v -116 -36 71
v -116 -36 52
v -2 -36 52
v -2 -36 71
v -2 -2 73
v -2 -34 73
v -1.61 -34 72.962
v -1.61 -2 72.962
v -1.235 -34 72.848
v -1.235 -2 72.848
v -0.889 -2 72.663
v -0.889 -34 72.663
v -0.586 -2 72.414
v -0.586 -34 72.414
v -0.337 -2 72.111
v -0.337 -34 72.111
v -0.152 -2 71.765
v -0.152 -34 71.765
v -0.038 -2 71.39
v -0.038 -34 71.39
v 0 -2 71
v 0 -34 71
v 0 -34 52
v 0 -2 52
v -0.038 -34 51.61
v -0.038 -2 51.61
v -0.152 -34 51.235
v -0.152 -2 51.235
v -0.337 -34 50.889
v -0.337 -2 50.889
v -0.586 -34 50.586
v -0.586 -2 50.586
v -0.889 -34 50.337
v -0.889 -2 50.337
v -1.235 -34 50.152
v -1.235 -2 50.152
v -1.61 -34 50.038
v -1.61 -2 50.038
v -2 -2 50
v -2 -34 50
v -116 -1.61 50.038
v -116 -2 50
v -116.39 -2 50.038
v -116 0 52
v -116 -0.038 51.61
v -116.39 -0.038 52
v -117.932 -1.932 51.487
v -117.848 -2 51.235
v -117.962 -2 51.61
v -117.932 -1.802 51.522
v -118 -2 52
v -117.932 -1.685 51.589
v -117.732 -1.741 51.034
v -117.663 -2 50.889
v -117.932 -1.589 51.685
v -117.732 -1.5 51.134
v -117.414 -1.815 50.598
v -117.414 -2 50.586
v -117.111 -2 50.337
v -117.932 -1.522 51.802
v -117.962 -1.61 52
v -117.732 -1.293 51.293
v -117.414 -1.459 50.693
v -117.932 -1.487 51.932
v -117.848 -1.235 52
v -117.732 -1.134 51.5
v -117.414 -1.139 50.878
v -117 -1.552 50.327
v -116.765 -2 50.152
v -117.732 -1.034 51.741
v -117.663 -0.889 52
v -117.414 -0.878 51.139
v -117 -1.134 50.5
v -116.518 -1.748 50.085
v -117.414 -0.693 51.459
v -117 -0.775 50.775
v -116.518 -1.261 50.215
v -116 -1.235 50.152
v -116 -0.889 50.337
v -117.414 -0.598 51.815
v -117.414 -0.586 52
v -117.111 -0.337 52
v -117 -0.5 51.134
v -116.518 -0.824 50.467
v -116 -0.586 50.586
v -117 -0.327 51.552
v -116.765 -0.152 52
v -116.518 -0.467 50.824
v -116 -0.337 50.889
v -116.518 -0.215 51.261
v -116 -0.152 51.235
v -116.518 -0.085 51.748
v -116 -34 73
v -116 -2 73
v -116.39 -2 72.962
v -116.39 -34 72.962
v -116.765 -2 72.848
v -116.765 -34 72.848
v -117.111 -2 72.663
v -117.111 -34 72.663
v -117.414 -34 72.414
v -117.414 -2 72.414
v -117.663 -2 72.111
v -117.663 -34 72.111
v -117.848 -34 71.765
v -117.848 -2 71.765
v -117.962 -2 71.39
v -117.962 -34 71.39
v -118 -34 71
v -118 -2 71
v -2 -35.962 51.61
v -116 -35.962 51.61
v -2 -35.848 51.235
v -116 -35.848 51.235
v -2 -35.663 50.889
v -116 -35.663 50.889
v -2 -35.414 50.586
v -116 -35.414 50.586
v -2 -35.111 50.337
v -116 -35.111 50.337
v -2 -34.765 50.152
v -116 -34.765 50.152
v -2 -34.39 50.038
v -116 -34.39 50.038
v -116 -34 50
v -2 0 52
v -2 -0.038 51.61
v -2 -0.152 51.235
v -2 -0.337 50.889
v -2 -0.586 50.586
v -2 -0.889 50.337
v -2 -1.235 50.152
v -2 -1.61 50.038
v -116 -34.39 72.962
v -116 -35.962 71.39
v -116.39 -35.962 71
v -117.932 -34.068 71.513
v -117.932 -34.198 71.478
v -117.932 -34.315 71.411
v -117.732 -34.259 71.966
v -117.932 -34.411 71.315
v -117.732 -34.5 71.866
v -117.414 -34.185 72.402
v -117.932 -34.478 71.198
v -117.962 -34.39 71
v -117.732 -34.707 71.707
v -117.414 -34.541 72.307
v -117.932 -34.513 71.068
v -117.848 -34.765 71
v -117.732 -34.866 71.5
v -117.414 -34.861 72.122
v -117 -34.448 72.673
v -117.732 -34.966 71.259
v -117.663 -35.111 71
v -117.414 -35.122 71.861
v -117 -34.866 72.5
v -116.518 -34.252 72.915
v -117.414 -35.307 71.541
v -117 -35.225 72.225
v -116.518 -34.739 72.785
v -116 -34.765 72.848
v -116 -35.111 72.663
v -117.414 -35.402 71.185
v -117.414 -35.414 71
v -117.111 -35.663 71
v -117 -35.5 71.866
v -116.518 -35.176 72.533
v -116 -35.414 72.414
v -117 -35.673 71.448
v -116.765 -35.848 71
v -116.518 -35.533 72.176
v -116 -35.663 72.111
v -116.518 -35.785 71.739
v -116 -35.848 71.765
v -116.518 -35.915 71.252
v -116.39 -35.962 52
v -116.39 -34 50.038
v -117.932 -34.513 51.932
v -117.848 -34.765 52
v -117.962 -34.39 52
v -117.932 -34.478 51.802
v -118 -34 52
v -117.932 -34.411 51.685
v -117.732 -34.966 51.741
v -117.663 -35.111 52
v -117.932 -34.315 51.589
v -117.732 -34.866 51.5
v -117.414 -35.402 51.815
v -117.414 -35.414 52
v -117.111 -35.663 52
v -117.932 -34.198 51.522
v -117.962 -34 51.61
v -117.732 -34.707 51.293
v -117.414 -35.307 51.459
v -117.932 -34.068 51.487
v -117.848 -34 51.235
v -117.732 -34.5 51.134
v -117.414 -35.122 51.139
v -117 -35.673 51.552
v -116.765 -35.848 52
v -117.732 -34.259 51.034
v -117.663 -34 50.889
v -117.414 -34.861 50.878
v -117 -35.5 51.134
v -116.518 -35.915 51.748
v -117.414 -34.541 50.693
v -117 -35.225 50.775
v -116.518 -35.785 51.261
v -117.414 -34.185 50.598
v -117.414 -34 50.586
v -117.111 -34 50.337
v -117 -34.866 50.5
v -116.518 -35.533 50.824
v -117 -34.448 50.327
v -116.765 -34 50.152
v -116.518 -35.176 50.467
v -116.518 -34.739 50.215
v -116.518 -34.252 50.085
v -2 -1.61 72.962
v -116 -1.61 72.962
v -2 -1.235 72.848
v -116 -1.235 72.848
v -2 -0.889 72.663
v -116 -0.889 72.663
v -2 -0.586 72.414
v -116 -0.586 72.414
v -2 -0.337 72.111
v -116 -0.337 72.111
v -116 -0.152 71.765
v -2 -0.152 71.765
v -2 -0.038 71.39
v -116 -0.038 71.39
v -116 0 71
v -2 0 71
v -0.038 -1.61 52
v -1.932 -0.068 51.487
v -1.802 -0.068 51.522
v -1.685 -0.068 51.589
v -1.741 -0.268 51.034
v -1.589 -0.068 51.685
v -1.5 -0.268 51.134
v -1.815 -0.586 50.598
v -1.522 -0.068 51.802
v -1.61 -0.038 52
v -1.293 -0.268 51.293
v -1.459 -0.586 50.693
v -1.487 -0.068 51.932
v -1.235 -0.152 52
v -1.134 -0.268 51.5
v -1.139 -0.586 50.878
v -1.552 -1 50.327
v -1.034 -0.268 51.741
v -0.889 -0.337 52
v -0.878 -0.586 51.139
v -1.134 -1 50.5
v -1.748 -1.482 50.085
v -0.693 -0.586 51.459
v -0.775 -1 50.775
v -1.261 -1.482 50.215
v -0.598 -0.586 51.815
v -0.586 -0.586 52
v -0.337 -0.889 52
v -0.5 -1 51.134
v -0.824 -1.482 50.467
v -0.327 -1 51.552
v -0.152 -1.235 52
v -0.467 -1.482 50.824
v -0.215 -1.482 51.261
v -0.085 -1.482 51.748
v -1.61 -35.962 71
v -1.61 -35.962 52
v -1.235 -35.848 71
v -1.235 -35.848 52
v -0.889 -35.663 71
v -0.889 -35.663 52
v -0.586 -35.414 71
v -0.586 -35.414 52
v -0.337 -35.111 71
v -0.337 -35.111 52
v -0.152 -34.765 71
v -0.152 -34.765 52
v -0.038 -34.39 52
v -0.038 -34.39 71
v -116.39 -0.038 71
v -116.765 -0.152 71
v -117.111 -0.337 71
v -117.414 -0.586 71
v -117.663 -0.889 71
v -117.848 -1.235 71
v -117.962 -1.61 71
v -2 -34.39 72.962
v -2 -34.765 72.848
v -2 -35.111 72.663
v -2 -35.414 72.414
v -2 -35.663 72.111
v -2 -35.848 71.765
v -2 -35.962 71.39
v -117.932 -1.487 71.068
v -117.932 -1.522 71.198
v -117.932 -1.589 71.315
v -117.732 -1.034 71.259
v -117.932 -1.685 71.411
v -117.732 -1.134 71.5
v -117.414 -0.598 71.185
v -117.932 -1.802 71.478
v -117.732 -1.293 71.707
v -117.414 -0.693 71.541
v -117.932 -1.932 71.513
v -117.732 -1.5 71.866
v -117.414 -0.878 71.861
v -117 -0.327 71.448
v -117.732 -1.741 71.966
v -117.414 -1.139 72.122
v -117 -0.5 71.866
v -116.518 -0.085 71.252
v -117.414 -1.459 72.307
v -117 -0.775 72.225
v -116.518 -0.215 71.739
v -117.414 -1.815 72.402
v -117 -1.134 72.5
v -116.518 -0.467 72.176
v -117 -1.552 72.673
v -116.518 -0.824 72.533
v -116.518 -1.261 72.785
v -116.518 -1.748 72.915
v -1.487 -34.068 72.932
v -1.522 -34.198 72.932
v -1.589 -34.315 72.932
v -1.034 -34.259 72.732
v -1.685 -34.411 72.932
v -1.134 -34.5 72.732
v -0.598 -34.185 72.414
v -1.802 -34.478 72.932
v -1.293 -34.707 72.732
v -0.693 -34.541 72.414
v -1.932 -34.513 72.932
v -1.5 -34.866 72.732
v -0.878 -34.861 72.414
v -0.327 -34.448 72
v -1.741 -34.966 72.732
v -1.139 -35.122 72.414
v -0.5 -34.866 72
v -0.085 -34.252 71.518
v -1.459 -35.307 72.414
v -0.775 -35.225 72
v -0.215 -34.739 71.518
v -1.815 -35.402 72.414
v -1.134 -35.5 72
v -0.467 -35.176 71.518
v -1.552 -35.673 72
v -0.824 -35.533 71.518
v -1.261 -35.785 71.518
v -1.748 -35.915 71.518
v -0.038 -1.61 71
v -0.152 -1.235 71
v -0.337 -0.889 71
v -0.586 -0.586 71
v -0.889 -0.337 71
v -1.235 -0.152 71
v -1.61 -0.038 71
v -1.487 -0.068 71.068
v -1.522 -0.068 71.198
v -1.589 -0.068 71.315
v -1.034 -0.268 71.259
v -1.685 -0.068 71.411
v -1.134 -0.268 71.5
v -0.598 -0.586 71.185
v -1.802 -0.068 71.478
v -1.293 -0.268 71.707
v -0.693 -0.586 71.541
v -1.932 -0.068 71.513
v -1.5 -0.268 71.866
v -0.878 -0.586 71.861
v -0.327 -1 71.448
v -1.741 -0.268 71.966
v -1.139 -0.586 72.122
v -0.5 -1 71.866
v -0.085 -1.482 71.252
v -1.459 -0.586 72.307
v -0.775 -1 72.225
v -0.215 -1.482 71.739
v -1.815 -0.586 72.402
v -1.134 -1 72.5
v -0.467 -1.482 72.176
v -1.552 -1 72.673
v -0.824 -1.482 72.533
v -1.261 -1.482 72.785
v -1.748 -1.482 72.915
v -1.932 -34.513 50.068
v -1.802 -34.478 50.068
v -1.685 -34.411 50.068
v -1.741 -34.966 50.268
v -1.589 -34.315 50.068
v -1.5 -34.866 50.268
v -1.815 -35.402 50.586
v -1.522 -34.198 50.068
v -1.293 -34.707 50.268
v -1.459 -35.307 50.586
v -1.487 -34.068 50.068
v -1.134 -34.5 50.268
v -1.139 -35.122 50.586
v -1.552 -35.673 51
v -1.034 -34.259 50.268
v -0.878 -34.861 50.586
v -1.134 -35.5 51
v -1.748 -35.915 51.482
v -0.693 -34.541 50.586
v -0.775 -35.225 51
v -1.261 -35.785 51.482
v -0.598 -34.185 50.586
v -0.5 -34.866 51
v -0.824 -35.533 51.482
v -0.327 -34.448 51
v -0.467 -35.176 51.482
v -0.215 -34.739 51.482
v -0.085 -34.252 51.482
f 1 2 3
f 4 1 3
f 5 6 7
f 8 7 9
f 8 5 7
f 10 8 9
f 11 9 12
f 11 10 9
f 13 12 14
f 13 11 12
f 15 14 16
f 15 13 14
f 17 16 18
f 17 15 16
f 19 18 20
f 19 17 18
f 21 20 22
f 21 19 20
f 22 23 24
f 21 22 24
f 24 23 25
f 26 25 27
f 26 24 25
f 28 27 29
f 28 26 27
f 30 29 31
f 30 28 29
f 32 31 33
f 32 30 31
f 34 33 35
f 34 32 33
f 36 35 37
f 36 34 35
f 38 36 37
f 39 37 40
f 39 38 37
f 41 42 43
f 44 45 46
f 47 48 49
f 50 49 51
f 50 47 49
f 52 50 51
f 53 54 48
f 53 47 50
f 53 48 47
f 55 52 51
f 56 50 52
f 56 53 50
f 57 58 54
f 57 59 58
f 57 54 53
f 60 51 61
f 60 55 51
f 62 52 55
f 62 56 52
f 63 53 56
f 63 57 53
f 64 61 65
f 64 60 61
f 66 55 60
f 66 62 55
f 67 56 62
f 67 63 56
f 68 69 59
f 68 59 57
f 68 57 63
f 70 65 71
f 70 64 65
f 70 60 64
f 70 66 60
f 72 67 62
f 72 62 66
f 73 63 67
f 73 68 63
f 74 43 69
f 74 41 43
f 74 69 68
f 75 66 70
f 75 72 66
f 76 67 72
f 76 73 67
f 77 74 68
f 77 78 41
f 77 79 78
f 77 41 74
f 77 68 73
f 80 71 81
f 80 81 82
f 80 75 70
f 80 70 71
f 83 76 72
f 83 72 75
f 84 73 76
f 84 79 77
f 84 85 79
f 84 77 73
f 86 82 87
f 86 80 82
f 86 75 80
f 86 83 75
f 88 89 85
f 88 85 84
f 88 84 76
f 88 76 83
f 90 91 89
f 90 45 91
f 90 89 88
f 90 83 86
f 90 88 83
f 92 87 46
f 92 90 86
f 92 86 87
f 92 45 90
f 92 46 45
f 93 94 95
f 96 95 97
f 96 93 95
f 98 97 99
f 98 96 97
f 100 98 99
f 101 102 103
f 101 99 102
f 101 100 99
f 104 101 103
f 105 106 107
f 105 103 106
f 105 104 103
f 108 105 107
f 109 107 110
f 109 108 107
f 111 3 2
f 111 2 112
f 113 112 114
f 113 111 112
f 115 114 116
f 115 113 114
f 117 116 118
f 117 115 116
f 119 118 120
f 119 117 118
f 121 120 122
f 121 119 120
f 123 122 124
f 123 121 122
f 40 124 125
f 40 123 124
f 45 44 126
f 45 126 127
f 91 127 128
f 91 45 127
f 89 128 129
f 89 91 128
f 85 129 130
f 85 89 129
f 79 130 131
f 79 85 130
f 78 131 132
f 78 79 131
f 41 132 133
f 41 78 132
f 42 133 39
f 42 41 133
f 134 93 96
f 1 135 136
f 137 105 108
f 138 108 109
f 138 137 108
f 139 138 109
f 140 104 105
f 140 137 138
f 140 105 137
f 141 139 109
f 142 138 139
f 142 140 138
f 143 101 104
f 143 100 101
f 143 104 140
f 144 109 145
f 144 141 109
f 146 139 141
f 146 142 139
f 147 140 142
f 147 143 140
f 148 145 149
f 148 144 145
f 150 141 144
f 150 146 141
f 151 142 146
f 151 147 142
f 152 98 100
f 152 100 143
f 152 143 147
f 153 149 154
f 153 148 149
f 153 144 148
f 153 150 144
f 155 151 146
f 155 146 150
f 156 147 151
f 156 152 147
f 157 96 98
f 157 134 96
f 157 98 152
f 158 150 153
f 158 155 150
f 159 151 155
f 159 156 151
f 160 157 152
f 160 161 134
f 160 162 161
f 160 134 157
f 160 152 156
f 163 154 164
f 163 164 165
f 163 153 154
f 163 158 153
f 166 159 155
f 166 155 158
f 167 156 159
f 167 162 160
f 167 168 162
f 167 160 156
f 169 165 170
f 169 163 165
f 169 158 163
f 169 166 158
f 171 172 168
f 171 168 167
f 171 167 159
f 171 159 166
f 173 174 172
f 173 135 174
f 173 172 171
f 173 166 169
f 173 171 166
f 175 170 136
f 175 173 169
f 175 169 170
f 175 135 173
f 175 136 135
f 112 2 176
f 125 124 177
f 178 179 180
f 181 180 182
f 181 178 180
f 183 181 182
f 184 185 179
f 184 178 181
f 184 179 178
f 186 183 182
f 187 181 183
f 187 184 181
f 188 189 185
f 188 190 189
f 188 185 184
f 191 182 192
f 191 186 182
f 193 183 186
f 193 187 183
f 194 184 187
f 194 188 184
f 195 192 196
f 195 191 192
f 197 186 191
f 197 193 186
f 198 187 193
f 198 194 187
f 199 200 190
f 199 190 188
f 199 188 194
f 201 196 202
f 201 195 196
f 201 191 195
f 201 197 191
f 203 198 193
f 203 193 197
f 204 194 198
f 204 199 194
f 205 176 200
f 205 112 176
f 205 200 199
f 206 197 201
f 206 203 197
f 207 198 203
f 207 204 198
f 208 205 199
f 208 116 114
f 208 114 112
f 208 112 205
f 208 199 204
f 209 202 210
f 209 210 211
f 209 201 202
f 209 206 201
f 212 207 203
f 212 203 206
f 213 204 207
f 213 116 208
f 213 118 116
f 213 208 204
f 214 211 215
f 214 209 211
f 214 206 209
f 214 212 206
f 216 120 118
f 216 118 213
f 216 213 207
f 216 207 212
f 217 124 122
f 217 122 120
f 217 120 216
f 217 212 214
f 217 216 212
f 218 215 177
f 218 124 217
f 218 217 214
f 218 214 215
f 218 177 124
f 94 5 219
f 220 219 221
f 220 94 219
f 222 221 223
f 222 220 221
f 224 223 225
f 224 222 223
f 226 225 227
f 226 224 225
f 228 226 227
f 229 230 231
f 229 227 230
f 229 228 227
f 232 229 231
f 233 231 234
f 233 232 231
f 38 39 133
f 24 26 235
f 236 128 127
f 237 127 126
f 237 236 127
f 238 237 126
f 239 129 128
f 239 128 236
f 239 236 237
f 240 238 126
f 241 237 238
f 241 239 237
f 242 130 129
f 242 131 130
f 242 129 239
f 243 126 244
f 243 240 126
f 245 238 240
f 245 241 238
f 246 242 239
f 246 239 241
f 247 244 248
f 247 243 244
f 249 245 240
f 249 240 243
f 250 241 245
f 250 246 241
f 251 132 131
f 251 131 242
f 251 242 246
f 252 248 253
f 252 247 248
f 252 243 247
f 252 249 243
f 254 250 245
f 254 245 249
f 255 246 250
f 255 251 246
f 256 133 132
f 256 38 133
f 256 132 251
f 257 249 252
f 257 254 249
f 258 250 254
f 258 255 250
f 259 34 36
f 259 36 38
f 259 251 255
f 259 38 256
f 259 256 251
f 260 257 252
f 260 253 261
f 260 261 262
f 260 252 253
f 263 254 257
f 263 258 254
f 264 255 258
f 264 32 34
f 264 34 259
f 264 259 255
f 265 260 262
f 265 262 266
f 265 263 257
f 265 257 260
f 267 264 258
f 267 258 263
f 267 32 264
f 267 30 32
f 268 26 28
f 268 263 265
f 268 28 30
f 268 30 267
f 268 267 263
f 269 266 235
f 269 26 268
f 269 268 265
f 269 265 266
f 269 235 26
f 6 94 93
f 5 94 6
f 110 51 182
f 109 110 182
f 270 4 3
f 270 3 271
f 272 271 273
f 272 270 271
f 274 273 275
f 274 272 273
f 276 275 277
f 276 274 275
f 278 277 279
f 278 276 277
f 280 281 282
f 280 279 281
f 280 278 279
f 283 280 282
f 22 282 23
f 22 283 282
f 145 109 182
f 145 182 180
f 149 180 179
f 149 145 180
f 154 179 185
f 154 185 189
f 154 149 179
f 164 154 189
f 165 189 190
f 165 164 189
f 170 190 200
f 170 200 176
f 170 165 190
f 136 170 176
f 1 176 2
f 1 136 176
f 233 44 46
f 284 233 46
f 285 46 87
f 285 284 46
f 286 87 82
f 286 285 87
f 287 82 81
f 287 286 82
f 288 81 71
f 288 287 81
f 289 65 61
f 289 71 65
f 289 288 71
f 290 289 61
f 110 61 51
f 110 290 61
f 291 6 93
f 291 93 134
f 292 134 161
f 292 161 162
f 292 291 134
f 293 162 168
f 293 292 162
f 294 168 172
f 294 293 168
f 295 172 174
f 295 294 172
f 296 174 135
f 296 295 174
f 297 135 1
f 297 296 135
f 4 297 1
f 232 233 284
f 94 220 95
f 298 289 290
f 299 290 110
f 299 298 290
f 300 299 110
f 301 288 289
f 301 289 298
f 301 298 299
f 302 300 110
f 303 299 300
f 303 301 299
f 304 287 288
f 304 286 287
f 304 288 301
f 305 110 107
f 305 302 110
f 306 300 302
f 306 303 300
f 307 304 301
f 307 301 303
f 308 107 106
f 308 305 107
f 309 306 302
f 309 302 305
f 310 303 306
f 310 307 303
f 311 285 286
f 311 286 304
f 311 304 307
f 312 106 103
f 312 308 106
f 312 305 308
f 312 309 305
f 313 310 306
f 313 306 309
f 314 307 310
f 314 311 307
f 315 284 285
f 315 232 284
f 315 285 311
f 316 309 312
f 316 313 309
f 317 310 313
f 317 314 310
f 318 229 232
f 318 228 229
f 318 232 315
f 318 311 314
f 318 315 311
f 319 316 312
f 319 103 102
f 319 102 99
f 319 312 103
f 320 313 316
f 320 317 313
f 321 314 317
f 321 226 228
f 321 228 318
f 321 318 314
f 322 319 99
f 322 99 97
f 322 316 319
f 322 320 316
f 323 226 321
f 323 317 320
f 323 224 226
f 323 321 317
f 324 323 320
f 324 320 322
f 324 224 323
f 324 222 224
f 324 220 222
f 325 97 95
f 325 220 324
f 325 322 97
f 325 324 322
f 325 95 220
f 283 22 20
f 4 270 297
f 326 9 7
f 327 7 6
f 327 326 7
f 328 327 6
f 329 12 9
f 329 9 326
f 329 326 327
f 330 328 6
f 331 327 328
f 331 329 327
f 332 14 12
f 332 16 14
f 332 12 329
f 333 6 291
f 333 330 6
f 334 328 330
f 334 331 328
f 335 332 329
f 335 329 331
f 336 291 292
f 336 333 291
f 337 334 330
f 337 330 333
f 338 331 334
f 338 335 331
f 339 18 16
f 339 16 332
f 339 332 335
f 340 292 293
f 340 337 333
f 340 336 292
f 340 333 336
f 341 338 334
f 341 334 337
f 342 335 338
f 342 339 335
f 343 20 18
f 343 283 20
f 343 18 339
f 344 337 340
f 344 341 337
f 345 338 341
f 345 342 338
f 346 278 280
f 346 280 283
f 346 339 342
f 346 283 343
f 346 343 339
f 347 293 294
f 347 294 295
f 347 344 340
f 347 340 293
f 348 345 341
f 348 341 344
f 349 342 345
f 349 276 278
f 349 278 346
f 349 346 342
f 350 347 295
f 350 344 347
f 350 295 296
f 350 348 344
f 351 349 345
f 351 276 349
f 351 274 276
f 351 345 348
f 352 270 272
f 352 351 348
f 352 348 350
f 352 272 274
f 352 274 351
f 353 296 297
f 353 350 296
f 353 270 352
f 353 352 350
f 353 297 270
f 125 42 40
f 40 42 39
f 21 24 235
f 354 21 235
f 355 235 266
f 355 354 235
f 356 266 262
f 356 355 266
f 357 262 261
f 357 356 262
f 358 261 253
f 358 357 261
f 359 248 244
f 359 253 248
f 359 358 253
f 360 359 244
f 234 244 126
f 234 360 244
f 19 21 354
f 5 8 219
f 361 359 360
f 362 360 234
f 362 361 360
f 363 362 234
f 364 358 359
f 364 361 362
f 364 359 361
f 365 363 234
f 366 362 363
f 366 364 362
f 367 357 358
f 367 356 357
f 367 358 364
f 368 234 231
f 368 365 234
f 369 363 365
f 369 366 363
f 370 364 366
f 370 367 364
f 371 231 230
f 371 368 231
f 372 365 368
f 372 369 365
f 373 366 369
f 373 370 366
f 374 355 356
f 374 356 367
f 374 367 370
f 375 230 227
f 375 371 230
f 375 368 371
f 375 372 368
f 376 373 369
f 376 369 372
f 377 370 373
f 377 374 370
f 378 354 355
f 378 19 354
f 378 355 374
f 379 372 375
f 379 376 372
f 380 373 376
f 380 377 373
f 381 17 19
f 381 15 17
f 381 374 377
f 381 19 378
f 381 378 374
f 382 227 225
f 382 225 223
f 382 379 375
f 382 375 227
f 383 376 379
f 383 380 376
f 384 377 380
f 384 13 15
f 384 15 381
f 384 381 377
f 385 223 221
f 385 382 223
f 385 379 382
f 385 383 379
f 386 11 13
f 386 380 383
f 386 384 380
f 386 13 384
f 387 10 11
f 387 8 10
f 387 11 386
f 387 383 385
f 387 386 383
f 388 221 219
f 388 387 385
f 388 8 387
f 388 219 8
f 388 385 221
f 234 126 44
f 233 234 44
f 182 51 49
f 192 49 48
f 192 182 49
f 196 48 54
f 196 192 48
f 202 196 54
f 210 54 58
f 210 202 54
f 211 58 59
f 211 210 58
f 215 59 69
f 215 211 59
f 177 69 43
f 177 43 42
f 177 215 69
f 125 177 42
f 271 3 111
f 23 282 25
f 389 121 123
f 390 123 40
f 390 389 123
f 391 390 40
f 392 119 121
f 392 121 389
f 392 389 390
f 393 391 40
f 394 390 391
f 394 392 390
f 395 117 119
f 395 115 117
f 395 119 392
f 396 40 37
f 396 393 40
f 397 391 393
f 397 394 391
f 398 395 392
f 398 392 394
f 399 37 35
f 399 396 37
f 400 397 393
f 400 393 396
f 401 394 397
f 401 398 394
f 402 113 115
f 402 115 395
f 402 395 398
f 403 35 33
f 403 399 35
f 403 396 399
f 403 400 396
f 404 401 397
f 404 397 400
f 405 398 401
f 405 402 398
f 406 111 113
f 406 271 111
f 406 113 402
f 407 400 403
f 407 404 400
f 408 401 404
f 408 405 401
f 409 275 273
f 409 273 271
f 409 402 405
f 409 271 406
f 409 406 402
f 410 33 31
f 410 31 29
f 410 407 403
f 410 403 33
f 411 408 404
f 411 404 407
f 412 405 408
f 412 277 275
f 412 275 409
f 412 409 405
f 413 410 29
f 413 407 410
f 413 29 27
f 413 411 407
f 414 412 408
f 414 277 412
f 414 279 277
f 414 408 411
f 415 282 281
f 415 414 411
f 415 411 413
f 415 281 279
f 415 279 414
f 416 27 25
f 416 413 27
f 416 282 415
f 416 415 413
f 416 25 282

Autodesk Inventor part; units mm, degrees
ref_plane "YZ Plane" through (0, 0, 0) normal (1, 0, 0) x (0, 1, 0)
ref_plane "XZ Plane" through (0, 0, 0) normal (0, 1, 0) x (-1, 0, 0)
ref_plane "XY Plane" through (0, 0, 0) normal (0, 0, 1) x (1, 0, 0)
ref_plane "工作平面1" through (0, 0, 50) normal (0, 0, 1) x (1, 0, 0)
sketch "草图1" plane through (0, 0, 50) normal (0, 0, 1) x (1, 0, 0)
  line L0 (0, 0) -> (-118, 0)
  line L1 (-118, 0) -> (-118, -36)
  line L2 (-118, -36) -> (0, -36)
  line L3 (0, -36) -> (0, 0)
  dimension "d0" = 118
  dimension "d1" = 36
extrude "拉伸1" add sketch "草图1" along normal blind 23
fillet "圆角1" radius 2 12 edges at (0, -36, 61.5) (-59, -36, 73) (0, -18, 73) (0, -18, 50) (0, 0, 61.5) (-59, -36, 50) (-59, 0, 50) (-59, 0, 73) (-118, -18, 50) (-118, 0, 61.5) (-118, -18, 73) (-118, -36, 61.5)
properties part number "电池"
